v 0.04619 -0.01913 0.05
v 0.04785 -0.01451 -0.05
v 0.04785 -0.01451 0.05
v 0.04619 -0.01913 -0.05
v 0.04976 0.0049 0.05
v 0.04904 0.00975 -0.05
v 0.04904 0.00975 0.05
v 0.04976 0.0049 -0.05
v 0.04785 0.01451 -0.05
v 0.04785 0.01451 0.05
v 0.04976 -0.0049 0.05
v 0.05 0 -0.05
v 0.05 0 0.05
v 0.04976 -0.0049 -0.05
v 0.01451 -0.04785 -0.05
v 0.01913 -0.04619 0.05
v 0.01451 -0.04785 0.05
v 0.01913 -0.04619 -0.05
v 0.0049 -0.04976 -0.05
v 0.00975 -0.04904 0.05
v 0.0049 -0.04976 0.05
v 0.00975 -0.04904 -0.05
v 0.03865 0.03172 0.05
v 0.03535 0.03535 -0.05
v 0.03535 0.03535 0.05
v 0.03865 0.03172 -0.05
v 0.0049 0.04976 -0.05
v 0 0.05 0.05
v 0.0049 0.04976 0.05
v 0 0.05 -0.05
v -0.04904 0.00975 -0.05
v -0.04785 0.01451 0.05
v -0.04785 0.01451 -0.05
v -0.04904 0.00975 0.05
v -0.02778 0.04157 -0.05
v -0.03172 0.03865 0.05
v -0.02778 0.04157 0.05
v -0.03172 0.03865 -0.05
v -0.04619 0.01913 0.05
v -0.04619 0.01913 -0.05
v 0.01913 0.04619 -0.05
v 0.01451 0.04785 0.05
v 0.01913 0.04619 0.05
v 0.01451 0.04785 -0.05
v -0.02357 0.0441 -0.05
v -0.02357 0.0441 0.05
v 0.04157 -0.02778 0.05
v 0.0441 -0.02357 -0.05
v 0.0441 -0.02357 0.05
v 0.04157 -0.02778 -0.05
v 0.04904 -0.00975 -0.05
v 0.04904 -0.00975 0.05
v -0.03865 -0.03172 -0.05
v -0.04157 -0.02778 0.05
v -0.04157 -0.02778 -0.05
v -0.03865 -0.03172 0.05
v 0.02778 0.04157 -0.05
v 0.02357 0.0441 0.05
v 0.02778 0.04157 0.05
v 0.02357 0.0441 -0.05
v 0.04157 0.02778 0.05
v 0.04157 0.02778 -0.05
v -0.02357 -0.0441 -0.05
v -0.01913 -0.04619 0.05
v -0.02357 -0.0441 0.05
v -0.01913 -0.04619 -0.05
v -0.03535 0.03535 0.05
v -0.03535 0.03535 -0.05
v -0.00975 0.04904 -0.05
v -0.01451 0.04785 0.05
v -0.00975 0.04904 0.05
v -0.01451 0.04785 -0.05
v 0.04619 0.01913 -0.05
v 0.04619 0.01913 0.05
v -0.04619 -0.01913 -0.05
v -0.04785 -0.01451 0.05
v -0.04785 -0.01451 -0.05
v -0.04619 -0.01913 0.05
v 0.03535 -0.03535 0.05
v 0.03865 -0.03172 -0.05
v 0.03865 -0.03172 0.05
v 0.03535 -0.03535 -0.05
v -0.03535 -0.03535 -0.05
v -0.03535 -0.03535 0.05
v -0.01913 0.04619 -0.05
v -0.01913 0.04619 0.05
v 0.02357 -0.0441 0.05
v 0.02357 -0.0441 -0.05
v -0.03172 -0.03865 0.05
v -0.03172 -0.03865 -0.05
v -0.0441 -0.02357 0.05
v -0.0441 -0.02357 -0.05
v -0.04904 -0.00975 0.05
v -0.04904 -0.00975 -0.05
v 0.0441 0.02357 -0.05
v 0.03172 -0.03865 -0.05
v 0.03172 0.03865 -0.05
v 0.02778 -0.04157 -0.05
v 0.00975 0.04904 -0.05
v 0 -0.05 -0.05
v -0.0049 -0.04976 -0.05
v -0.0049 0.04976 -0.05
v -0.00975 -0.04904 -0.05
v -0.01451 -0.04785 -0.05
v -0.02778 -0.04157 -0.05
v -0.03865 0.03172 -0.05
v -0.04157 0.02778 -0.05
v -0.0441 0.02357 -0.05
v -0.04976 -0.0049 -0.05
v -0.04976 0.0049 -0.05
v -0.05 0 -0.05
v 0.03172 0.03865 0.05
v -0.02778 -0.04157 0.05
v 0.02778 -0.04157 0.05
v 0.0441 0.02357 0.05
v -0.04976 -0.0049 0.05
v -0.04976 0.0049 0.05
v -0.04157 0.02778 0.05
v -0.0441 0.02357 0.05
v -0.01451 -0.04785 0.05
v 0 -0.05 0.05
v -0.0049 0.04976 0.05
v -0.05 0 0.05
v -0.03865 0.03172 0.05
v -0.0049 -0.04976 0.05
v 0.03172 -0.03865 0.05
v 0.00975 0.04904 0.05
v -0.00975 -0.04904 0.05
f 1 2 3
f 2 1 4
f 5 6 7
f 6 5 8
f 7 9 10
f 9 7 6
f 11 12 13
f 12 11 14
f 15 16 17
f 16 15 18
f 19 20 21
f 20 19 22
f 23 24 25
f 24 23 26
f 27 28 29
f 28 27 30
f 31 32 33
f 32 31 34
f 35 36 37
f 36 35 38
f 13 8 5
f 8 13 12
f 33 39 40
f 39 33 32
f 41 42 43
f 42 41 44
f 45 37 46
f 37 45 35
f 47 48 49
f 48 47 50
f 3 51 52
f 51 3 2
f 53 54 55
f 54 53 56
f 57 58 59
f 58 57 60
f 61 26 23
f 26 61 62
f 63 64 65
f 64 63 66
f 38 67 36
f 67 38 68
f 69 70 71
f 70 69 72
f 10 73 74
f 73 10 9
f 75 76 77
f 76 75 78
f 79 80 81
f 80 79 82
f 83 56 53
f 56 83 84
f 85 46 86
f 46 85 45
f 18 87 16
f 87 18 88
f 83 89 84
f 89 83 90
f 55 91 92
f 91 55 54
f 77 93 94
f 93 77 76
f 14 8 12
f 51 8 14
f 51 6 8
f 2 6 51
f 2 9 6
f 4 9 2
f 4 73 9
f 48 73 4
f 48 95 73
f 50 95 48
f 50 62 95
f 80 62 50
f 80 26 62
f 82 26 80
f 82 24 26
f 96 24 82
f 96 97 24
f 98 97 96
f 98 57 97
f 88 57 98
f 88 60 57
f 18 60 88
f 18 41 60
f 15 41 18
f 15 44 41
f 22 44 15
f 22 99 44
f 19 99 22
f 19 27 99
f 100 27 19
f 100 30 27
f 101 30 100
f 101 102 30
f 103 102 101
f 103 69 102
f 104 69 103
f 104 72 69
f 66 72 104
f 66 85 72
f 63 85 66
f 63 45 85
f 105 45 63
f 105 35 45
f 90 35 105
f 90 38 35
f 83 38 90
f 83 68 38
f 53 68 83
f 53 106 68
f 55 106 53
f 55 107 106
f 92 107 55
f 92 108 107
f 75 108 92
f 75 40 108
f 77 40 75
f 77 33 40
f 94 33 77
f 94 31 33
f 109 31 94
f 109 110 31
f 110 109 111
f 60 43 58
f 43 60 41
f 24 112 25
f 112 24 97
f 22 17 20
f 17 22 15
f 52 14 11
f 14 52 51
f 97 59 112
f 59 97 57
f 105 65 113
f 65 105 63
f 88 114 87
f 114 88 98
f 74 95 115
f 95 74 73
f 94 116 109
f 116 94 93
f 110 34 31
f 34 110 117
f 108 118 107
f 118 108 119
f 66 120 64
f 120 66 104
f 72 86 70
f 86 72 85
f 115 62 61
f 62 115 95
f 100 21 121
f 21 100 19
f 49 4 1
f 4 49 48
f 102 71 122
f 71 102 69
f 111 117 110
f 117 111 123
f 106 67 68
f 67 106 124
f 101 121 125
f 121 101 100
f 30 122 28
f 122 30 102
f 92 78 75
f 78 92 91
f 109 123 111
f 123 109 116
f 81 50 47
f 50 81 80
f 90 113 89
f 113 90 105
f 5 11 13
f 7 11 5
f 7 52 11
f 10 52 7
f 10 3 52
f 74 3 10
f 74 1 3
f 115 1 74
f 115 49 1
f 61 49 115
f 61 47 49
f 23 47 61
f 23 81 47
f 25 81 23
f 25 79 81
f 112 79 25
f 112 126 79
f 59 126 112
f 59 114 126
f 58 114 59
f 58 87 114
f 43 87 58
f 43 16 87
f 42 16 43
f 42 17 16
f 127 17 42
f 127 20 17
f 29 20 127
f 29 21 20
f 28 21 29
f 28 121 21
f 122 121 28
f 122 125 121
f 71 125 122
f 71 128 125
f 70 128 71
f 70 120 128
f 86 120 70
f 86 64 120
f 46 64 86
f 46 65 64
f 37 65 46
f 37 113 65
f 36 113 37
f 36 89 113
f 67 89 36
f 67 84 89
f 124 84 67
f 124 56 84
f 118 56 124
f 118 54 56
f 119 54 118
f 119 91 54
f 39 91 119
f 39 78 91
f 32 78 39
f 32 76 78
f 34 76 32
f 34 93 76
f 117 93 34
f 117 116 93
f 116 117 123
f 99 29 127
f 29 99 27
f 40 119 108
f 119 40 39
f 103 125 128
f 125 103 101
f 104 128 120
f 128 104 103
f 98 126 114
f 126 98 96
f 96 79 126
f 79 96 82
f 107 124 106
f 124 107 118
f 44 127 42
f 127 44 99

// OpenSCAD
module starburst_gear(radius, teeth, thickness) {
    difference() {
        cylinder(r=radius, h=thickness, $fn=64);
        for (i = [0:360/teeth:360-360/teeth]) {
            rotate([0, 0, i])
            translate([radius, 0, 0])
            rotate([0, 0, -90])
            polygon(points=[[0, 0], [-radius/teeth, -radius/2], [radius/teeth, -radius/2]]);
        }
    }
}

translate([0, 0, -0.05])
starburst_gear(0.05, 20, 0.1);
